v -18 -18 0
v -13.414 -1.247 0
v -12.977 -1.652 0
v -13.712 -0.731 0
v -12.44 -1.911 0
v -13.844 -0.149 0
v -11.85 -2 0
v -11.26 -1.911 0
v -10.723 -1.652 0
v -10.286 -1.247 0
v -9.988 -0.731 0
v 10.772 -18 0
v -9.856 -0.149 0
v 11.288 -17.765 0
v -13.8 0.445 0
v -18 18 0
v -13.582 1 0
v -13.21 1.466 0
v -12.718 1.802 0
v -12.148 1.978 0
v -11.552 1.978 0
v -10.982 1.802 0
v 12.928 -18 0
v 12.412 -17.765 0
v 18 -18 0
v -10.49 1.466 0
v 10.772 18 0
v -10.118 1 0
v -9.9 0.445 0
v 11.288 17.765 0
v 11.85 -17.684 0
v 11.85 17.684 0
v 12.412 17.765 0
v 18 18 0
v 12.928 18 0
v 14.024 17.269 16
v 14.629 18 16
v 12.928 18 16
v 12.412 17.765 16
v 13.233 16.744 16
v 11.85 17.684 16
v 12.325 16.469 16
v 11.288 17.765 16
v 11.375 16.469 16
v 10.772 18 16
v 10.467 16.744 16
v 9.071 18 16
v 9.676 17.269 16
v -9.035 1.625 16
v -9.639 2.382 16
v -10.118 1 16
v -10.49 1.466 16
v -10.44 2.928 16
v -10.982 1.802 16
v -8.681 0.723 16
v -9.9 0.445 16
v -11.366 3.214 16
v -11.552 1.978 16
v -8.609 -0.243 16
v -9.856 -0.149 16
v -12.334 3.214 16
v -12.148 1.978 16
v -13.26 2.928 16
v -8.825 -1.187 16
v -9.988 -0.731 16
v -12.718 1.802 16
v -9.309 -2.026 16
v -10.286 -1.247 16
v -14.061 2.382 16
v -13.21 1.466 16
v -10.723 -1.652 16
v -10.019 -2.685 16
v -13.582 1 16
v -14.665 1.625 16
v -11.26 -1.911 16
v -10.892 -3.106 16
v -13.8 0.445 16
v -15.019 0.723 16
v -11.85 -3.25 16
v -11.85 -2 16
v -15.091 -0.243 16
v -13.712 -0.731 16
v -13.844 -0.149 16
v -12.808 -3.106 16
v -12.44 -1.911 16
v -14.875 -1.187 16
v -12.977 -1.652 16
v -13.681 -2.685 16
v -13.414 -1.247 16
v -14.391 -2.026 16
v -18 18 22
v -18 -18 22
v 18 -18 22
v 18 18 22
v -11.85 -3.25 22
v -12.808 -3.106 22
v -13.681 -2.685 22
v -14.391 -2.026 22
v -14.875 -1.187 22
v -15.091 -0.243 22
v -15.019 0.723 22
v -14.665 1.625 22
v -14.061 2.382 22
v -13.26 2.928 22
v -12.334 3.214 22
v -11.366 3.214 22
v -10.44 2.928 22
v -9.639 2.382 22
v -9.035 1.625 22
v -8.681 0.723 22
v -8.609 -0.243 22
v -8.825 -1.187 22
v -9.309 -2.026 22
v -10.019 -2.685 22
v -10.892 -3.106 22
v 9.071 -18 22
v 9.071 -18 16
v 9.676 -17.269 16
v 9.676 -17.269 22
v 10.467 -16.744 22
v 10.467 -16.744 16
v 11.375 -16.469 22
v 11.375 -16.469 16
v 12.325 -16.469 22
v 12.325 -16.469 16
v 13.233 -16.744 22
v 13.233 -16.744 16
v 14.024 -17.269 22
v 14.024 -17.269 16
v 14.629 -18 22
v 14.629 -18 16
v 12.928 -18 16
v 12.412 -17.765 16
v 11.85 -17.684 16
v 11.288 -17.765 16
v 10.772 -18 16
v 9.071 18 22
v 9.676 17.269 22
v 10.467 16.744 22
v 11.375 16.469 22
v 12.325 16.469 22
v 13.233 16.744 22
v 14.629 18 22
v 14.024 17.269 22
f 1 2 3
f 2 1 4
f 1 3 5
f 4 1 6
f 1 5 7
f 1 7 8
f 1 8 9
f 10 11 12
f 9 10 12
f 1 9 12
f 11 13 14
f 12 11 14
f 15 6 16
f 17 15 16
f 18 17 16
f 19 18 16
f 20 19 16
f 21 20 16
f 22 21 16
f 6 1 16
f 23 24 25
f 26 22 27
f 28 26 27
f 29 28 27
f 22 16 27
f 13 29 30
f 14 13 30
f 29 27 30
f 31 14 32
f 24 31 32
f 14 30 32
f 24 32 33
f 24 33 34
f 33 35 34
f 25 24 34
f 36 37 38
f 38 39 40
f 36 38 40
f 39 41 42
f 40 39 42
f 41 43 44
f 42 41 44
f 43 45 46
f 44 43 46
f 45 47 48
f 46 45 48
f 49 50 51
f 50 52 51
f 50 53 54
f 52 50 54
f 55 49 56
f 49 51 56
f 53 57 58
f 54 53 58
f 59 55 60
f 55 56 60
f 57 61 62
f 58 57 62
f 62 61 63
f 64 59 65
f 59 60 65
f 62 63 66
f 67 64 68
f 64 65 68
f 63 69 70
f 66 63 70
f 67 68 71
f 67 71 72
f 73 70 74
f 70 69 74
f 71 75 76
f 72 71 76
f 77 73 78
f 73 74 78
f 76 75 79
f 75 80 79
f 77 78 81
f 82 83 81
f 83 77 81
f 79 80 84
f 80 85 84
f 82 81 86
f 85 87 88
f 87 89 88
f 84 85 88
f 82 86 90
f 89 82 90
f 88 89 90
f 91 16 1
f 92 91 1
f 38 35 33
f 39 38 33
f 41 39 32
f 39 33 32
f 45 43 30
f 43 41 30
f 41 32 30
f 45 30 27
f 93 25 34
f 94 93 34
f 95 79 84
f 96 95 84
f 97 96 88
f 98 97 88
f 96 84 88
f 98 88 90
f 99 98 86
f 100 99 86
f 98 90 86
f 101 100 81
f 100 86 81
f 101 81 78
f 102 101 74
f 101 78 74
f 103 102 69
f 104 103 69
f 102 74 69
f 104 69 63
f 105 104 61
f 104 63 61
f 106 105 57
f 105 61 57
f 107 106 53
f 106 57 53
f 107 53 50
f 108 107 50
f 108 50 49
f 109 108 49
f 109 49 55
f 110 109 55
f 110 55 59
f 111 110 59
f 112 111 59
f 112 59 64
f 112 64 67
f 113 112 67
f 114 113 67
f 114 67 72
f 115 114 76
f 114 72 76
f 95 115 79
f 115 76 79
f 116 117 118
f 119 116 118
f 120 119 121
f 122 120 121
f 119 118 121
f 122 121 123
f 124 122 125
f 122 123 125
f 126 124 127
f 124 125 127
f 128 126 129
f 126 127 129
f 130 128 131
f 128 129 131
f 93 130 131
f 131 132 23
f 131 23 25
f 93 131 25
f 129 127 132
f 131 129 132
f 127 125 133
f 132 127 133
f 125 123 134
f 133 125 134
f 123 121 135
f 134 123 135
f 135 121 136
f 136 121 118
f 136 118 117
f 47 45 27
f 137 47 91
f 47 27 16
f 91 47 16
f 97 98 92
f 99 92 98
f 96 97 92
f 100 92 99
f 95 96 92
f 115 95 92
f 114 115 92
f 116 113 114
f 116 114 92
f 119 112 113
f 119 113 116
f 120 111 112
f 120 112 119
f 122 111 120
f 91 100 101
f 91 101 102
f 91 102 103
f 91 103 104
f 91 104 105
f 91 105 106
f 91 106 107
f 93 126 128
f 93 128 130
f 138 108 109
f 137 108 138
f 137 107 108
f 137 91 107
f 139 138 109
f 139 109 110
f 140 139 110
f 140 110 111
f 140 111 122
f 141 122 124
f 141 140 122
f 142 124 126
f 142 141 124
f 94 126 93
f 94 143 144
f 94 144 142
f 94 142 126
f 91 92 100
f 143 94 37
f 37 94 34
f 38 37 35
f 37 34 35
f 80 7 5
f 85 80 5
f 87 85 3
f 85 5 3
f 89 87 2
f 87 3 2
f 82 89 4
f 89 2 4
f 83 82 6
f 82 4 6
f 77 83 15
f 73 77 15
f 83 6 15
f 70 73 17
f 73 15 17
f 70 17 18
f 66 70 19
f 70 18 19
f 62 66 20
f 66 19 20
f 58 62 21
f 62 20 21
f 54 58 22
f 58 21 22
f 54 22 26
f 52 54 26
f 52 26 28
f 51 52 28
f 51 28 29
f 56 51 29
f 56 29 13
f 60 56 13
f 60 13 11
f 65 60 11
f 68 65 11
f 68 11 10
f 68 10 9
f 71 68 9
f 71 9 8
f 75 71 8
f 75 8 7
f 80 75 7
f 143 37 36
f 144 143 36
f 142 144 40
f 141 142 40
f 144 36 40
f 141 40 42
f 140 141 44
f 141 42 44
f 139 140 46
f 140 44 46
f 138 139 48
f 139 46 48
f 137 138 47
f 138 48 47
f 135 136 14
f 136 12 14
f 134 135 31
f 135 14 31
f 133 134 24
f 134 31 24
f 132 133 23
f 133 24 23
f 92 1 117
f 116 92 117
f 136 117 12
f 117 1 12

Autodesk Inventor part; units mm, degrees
ref_plane "YZ Plane" through (0, 0, 0) normal (1, 0, 0) x (0, 1, 0)
ref_plane "XZ Plane" through (0, 0, 0) normal (0, 1, 0) x (-1, 0, 0)
ref_plane "XY Plane" through (0, 0, 0) normal (0, 0, 1) x (1, 0, 0)
ref_plane "Work Plane1" through (186.7197, -101.2807, 0) normal (0, 0, 1) x (1, 0, 0)
sketch "Sketch1" plane through (186.7197, -101.2807, 0) normal (0, 0, 1) x (1, 0, 0)
  line L0 (-168.7197, 119.2807) -> (-204.7197, 119.2807)
  line L1 (-204.7197, 119.2807) -> (-204.7197, 83.2807)
  line L2 (-204.7197, 83.2807) -> (-168.7197, 83.2807)
  line L3 (-168.7197, 83.2807) -> (-168.7197, 119.2807)
  point P0 (-186.7197, 101.2807)
  point P1 (-168.7197, 101.2807)
  point P2 (-186.7197, 83.2807)
  point P3 (-204.7197, 101.2807)
  dimension "d0" = 36
  dimension "d1" = 36
  dimension "d8" = 0
  dimension "d9" = 0
extrude "Extrusion1" add sketch "Sketch1" along normal blind 22
sketch "Sketch3" plane through (186.7197, -101.2807, 22) normal (0, 0, 1) x (1, 0, 0)
  circle A0 centre (-174.8697, 120.9651) radius 3.25
  circle A1 centre (-198.5697, 101.2807) radius 3.25
  line L0 (-211.9197, 101.2807) -> (-161.5197, 101.2807) projected
  circle A2 centre (-174.8697, 81.5964) radius 3.25
  line L1 (-174.8697, 120.9651) -> (-168.7197, 120.9651)
  line L2 (-168.7197, 83.2807) -> (-168.7197, 119.2807) projected
  line L3 (-198.5697, 101.2807) -> (-204.7197, 101.2807)
  line L4 (-204.7197, 119.2807) -> (-204.7197, 83.2807) projected
  point P0 (-186.7197, 101.2807)
  dimension "d10" = 6.5
  dimension "d11" = 6.5
  dimension "d12" = 23.7
hole "Hole1" at (11.85, -19.6844, 22) at (11.85, 19.6844, 22) at (-11.85, 0, 22) direction (0, 0, -1) diameter 6.5 depth 6
hole "Hole2" at (-11.85, 0, 22) at (11.85, -19.6844, 22) at (11.85, 19.6844, 22) direction (0, 0, -1) diameter 4 end through all
equation "\"d1\" = d0"
equation "\"d11\" = d10"
properties part number "Camera_mount"
